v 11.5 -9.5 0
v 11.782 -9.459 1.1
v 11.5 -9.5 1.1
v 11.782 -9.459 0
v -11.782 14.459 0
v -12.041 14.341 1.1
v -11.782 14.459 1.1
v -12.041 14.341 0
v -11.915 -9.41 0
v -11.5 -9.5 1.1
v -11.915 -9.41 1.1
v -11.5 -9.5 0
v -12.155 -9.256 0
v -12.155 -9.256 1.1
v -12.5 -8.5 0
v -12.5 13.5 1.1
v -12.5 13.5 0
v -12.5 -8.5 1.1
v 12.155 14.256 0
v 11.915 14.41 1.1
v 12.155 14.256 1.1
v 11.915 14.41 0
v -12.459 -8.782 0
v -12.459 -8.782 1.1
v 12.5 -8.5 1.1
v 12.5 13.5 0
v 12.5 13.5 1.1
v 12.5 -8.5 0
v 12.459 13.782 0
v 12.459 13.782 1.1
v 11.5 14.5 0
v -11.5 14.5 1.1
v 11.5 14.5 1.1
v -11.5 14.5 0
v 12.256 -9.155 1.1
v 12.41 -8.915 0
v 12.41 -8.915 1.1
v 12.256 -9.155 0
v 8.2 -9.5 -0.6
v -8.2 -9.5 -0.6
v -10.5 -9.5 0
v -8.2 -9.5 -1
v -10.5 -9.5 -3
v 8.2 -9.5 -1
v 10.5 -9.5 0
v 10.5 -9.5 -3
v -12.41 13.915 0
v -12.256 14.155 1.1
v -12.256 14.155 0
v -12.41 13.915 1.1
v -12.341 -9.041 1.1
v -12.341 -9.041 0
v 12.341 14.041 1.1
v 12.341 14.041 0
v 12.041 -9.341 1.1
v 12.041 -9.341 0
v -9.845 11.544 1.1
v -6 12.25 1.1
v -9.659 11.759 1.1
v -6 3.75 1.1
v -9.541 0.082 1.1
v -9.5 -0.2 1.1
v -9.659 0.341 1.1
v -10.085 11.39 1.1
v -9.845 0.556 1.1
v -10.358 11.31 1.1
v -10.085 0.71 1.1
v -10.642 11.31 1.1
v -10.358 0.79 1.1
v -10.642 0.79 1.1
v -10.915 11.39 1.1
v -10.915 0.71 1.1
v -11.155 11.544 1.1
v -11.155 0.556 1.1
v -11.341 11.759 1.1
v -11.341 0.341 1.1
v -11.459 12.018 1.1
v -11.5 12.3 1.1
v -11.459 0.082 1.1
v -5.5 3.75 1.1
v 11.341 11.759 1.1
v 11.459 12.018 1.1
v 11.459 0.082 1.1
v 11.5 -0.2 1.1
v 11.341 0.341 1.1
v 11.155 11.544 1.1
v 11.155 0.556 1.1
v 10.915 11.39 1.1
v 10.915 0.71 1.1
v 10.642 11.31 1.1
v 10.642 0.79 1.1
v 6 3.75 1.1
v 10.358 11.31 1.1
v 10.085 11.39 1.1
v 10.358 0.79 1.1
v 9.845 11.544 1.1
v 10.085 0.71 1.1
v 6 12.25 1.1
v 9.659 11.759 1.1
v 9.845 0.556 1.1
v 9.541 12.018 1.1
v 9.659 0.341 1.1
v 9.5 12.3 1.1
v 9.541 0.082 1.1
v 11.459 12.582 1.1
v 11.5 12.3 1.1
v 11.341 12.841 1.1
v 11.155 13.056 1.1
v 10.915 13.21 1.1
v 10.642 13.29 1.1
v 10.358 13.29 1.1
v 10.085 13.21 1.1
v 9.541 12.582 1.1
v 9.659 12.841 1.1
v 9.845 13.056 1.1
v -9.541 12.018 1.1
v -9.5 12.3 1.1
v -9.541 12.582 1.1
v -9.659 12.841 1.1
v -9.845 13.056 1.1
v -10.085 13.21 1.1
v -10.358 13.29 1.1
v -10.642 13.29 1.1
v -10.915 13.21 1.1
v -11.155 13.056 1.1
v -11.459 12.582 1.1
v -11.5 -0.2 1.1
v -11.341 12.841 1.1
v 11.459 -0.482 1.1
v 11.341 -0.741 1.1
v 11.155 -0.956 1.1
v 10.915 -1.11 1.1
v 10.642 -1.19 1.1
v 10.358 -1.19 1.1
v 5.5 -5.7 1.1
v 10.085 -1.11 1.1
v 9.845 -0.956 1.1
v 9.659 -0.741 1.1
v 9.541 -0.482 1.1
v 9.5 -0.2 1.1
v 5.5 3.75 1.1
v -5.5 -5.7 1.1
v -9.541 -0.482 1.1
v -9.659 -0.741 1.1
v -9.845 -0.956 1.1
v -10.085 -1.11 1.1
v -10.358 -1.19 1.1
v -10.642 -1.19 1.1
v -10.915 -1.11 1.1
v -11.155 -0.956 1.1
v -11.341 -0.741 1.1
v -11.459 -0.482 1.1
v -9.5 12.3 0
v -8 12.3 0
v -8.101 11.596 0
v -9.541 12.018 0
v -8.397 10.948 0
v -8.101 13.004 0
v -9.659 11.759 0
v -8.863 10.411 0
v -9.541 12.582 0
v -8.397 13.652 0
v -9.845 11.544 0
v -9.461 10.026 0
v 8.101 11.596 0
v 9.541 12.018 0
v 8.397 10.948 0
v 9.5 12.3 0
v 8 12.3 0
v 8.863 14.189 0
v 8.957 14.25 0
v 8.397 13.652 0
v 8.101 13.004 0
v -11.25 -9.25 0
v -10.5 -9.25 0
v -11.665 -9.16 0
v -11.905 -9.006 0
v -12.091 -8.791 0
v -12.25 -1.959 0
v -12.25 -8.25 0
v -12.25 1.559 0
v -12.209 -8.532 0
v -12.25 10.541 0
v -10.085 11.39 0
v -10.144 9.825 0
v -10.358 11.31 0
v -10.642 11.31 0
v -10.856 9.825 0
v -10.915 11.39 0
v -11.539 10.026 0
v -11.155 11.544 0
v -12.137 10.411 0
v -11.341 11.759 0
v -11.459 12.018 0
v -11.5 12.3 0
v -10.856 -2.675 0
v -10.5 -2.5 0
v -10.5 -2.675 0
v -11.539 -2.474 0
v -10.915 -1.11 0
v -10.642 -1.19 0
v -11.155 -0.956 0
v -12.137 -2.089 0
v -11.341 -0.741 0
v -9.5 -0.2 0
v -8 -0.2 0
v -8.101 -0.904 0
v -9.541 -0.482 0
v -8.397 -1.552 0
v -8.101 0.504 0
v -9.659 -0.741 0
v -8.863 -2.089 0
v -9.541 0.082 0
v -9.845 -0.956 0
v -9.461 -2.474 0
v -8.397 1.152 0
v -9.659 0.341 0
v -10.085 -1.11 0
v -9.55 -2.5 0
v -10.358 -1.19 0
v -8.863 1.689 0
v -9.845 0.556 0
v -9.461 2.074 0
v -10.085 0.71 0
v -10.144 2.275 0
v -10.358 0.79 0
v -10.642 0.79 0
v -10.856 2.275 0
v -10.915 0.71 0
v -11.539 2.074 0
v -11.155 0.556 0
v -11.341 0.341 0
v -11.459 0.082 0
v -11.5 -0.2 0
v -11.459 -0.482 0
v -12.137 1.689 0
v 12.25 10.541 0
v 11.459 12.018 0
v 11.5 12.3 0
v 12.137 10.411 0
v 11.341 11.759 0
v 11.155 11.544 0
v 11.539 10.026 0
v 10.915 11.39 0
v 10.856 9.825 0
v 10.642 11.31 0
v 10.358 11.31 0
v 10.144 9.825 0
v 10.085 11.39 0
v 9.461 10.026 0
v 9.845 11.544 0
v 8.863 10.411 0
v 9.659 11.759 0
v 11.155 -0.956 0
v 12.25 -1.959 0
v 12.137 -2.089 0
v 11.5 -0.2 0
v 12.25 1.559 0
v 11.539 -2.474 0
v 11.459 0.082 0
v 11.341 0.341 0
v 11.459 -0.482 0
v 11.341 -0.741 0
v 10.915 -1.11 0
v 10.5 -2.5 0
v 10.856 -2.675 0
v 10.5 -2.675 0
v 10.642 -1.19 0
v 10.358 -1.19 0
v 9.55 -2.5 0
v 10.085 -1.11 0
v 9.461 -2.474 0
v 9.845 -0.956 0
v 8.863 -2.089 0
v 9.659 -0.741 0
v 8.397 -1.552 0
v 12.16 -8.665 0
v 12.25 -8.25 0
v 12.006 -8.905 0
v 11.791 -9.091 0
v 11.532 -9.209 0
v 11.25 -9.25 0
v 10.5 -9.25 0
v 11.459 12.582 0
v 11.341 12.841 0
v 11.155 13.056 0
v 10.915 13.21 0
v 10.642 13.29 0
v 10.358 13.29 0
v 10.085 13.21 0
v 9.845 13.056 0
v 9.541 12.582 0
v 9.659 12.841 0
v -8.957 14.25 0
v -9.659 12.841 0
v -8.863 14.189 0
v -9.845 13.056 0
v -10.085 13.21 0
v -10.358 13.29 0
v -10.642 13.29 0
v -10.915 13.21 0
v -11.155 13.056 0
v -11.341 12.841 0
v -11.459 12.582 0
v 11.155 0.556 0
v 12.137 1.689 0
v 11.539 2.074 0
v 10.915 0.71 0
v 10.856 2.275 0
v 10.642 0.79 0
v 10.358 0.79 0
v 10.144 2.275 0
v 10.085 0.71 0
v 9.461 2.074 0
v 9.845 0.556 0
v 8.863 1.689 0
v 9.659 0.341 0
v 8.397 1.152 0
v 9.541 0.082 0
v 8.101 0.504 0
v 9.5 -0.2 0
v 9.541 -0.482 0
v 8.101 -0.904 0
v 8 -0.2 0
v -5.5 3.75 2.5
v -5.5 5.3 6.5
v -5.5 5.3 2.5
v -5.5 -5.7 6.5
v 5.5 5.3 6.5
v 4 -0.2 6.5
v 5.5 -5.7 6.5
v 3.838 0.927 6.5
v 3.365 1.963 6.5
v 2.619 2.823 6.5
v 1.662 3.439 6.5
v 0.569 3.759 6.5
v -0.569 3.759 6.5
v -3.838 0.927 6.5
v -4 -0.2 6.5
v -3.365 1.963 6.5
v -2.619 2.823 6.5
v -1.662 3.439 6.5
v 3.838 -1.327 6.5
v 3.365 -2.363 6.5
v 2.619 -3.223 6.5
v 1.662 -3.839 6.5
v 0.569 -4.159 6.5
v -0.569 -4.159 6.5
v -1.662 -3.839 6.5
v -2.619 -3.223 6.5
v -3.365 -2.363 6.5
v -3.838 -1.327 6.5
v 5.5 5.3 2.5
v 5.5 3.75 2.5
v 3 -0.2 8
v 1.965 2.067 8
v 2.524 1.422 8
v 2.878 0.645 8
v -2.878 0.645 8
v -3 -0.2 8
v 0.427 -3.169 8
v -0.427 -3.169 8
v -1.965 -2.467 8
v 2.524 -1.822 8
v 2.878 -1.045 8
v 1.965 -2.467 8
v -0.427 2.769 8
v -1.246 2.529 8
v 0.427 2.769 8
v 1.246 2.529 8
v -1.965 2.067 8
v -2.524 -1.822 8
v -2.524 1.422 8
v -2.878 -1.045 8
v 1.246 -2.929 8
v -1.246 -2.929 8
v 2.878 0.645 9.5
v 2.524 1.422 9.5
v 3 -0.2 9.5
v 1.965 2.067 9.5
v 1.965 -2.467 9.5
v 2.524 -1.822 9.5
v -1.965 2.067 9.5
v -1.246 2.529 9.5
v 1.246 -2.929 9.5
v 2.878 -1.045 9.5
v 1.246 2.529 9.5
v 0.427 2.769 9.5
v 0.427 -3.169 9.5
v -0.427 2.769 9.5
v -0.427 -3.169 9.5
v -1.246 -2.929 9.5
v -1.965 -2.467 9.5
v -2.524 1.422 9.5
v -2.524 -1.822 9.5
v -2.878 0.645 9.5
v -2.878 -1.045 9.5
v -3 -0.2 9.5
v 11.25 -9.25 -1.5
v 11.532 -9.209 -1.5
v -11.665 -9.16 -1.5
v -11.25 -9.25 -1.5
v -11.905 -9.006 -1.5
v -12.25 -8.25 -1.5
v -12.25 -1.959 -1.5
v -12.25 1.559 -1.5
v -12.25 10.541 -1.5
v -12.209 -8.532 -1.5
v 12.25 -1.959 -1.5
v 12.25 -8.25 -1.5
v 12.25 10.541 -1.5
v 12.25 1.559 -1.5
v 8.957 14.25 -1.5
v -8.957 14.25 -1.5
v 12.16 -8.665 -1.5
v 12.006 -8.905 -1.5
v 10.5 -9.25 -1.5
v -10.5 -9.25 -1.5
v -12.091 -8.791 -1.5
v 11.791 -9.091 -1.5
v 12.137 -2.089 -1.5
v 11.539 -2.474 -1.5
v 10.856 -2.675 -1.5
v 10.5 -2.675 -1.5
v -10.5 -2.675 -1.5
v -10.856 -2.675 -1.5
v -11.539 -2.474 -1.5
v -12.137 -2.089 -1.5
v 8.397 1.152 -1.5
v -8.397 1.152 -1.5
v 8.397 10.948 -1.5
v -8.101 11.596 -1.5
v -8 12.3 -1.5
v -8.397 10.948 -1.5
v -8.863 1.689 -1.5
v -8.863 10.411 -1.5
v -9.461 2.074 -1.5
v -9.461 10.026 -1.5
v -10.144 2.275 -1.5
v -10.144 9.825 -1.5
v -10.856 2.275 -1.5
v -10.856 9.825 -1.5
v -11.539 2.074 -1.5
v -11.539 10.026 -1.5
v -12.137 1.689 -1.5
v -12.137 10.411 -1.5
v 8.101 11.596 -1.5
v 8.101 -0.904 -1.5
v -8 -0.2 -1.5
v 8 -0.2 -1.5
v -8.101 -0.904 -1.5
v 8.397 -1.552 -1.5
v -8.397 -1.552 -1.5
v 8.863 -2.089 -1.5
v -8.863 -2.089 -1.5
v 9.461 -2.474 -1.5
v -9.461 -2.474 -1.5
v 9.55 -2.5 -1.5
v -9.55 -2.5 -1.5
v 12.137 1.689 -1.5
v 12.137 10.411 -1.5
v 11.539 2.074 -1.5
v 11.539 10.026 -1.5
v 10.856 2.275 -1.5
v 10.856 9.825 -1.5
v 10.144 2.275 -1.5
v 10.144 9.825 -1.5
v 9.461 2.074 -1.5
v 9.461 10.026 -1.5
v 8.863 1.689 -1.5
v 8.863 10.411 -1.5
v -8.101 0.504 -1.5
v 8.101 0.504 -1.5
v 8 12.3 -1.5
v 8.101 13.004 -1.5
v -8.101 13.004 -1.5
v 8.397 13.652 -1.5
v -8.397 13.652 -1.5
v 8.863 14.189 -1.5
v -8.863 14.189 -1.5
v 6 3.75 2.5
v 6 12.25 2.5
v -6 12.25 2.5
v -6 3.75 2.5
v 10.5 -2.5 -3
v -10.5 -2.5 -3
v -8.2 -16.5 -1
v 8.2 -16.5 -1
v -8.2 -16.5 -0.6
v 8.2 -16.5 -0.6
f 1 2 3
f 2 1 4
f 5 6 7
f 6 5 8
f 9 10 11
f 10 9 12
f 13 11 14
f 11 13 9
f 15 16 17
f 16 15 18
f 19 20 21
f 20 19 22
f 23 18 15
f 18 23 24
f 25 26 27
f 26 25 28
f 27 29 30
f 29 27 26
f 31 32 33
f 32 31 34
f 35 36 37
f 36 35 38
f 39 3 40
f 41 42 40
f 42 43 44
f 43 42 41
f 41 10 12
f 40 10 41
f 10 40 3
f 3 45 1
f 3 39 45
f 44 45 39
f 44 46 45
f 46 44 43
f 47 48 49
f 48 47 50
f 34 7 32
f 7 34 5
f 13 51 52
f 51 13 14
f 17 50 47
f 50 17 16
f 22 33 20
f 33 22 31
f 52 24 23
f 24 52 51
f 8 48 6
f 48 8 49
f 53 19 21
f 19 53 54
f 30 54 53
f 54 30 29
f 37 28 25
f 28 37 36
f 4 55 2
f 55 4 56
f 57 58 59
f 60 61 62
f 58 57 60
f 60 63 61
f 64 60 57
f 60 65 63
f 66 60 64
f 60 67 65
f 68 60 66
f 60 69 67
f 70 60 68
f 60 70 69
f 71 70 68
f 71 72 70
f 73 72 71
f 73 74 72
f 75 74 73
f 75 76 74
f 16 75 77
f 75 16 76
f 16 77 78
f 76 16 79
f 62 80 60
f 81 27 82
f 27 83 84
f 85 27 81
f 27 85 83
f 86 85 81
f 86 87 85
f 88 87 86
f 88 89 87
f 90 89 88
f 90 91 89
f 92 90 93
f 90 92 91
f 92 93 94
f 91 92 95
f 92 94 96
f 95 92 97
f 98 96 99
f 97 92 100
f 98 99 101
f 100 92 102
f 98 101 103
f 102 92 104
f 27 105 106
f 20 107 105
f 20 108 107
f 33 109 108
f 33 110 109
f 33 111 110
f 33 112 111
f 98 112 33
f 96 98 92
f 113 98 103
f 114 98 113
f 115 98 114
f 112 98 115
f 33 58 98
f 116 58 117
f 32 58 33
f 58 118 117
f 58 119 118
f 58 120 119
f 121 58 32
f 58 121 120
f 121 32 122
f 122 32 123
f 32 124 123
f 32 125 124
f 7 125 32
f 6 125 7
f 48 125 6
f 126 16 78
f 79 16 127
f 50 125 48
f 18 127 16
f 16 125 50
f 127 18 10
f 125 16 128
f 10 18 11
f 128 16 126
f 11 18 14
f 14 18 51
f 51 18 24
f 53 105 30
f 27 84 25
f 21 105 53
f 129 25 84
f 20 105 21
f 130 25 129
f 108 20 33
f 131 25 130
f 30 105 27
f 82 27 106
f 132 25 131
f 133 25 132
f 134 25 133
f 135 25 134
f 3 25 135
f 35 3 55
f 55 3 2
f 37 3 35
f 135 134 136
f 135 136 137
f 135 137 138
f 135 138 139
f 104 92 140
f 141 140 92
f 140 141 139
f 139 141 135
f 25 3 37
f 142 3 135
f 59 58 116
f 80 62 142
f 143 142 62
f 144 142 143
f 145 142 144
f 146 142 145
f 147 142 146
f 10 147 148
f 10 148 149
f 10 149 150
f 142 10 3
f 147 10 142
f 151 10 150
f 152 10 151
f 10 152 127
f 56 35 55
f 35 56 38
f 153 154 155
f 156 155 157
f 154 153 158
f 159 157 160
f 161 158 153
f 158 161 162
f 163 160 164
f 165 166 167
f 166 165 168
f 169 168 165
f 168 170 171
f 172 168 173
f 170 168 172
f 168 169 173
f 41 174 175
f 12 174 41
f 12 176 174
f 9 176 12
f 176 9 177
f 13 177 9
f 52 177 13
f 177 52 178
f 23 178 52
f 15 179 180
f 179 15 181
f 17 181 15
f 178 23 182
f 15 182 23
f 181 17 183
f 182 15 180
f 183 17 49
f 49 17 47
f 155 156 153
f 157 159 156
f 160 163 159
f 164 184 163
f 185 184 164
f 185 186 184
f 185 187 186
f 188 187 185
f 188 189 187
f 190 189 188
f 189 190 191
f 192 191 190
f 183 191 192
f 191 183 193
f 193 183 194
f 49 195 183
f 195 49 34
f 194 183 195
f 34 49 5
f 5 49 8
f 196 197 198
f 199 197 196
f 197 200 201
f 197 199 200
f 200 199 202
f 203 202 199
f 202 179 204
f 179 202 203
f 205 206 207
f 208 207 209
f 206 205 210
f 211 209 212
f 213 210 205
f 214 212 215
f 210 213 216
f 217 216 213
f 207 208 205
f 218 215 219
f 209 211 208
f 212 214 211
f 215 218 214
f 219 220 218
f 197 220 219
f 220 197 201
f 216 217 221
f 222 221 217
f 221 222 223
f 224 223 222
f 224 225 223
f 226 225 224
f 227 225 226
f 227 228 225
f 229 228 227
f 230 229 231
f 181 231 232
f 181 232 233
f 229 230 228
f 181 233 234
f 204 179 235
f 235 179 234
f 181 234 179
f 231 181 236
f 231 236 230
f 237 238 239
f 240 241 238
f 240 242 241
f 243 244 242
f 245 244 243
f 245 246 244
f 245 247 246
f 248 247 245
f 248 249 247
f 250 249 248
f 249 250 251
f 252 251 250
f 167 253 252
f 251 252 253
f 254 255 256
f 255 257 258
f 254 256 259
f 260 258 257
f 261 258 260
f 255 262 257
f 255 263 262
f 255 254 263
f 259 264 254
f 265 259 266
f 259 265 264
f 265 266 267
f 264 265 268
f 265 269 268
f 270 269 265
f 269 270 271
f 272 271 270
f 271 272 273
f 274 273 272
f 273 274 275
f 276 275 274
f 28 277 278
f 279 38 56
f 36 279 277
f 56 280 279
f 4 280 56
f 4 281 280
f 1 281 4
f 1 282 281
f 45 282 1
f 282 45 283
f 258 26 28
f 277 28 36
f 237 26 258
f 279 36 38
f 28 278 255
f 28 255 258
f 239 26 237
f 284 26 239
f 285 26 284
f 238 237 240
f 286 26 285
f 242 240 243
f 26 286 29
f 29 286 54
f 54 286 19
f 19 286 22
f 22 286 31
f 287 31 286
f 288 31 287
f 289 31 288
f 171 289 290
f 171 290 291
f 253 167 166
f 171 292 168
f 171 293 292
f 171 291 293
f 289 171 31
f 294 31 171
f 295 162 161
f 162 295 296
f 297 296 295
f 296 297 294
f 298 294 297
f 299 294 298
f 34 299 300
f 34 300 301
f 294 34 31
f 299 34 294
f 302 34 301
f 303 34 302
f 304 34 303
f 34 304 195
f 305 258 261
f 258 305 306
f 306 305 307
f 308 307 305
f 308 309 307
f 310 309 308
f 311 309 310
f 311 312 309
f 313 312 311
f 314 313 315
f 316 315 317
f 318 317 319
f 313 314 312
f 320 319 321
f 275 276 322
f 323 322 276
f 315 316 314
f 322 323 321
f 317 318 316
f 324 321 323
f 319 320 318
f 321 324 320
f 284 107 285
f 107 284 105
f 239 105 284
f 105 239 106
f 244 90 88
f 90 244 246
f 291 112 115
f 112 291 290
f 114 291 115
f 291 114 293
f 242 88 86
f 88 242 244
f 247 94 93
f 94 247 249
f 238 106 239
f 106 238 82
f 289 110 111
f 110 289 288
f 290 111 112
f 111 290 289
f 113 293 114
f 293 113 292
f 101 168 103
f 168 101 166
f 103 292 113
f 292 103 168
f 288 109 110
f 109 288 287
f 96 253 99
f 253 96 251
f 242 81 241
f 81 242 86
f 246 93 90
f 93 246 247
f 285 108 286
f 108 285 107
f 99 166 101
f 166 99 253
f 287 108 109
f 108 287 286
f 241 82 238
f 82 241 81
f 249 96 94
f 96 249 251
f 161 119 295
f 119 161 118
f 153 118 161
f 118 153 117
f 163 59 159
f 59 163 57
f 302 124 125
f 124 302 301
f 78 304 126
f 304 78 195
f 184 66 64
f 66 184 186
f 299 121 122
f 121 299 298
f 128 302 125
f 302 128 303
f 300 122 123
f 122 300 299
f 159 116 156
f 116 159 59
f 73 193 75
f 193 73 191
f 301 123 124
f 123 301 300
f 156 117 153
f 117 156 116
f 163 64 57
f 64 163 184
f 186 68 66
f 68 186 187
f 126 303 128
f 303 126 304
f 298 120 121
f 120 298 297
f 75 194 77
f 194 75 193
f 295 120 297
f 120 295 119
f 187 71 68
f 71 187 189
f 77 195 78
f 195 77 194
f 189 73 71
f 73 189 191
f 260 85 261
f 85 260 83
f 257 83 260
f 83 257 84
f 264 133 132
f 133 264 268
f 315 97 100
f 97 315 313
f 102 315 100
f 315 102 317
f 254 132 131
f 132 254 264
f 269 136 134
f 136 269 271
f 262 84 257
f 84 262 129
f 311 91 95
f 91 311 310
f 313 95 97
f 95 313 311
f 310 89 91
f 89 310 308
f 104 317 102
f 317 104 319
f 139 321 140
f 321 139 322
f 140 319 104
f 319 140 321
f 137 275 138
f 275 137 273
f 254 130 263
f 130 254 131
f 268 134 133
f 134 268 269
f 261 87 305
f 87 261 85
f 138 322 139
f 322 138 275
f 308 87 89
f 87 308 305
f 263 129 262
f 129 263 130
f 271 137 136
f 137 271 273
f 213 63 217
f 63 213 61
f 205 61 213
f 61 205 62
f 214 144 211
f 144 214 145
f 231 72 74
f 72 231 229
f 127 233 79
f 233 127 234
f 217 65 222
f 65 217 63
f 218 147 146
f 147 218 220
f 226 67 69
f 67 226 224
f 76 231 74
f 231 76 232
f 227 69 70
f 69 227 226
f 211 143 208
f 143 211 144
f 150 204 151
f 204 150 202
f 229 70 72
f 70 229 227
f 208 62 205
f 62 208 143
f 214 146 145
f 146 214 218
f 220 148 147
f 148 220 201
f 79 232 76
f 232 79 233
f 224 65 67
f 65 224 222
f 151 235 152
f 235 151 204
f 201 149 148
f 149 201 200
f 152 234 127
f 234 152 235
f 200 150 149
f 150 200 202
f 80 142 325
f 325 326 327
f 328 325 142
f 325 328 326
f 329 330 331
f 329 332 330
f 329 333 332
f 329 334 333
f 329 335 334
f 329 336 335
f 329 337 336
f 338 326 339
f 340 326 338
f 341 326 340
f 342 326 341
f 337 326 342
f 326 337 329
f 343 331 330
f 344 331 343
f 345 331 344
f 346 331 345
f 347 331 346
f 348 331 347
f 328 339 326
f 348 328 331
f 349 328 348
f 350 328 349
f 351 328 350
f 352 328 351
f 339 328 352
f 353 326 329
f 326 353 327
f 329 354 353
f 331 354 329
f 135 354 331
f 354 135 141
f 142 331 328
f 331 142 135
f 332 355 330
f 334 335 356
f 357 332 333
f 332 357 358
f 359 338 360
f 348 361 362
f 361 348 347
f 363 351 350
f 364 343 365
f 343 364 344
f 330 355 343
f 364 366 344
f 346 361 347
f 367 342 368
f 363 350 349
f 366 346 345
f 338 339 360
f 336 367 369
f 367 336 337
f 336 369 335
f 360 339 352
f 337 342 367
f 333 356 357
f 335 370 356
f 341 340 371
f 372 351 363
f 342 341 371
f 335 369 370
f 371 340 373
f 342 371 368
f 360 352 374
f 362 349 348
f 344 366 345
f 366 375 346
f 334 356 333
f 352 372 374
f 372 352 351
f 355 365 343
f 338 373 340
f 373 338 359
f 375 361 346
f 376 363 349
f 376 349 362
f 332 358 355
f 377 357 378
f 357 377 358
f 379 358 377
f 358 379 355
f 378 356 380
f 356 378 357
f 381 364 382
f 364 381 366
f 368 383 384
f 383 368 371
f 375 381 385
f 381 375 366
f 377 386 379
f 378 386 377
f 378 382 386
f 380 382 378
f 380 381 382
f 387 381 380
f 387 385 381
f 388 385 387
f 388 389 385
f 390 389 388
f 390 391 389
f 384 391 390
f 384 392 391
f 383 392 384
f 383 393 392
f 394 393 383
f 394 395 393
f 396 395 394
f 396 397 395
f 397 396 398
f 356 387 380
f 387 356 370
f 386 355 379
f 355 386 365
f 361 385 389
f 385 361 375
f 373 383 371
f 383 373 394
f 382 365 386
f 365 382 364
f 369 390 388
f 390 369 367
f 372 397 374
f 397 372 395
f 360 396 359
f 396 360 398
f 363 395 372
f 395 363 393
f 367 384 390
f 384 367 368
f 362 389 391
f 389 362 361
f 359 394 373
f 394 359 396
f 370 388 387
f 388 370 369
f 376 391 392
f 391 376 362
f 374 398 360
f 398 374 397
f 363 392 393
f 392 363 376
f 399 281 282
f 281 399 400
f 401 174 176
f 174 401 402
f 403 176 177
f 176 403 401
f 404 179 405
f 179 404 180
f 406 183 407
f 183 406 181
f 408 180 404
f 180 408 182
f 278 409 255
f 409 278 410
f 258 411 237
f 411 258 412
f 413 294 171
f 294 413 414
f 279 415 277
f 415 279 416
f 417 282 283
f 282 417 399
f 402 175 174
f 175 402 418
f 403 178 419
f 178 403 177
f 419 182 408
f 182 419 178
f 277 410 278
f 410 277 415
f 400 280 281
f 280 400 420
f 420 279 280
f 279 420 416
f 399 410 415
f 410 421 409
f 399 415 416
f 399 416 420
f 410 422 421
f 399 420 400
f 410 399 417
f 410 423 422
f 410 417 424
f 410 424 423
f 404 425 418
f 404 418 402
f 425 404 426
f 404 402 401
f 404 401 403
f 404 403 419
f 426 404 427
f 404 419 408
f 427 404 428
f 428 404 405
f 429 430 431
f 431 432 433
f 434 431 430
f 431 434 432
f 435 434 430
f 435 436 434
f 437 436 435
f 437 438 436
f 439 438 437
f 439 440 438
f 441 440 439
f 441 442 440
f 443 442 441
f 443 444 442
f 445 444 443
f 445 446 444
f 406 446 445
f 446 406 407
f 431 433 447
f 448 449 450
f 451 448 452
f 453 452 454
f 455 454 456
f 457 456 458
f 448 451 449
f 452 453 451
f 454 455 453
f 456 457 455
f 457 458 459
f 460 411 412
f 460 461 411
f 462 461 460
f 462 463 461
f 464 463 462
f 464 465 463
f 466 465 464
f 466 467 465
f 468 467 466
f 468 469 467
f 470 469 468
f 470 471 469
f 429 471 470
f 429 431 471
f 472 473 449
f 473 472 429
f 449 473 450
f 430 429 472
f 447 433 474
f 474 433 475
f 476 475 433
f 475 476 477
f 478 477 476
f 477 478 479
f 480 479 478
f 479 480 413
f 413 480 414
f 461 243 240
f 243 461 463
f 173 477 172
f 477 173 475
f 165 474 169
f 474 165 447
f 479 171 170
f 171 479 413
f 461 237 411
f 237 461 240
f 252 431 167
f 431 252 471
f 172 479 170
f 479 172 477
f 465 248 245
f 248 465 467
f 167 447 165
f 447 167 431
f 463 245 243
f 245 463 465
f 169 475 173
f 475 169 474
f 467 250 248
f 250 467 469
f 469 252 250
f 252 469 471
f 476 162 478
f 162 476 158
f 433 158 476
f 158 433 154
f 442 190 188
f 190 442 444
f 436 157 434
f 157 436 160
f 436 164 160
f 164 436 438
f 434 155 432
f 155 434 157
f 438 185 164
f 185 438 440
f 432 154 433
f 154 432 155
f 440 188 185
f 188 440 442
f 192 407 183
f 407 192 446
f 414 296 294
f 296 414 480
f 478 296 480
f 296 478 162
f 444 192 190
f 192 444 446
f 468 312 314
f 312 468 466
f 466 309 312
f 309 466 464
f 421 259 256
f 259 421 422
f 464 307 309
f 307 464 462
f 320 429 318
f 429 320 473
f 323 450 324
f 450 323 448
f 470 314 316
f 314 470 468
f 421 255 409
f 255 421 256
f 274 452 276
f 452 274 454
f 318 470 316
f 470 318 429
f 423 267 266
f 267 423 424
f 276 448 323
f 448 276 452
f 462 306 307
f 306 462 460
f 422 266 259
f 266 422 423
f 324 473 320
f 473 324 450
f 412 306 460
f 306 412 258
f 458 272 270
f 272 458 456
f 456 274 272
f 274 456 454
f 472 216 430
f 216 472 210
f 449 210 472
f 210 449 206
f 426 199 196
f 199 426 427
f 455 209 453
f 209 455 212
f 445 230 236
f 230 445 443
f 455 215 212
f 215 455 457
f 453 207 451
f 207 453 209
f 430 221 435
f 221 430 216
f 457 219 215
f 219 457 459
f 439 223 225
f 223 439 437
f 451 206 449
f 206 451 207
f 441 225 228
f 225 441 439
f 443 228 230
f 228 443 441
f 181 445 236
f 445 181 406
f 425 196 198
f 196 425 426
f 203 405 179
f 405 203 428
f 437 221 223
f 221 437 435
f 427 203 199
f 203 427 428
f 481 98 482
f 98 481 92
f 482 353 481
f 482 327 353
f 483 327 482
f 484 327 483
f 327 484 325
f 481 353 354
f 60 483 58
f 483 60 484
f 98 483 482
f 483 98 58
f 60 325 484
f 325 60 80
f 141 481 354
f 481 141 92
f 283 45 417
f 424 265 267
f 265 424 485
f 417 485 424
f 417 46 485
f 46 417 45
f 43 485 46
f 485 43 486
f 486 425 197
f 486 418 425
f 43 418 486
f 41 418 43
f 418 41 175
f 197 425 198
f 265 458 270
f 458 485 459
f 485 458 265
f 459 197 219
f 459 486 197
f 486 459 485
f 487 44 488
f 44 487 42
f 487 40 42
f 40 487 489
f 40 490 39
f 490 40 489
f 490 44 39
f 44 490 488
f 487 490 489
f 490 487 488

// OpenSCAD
//======================================================================
// usbPower.scad
//
// USB Wall Charger, iGENJUN 2.4A Phone Charger Dual USB Port Cube 
// Power Plug
//
// DrTomFlint, 19 Oct 2024
//======================================================================

//----------------------------------------------------------------------
module cameraV3(){

  // translate so lense is centered
  translate([0,2.5,0]){
  
    // pcb  
    difference(){
        linear_extrude(height=1.1)
        offset(r=1,$fn=22)
        square([23,22],center=true);

        translate([10.5,9.8,0])
        cylinder(r=1,h=3,$fn=22);

        translate([-10.5,9.8,0])
        cylinder(r=1,h=3,$fn=22);

        translate([10.5,9.8-12.5,0])
        cylinder(r=1,h=3,$fn=22);

        translate([-10.5,9.8-12.5,0])
        cylinder(r=1,h=3,$fn=22);
    }

    // lens and box
    translate([0,-2.7,0]){
        linear_extrude(height=6.5)
        square([11,11],center=true);
        translate([0,0,6.5])
        cylinder(r1=8/2,r2=6/2,h=1.5,$fn=22);
        translate([0,0,6.5+1.5])
        cylinder(r=6/2,h=1.5,$fn=22);
    }

    // cable off lens box
    color("red")
    translate([0,5.5,1.25])
    cube([12,8.5,2.5],center=true);

    // main cable
    color("green")
    translate([0,-12+3.5,-1.5])
    cube([21,7,3],center=true);

    // ribbon if needed
    color("orange")
    translate([0,-14,-1])
    linear_extrude(height=0.4)
    square([16.4,10],center=true);

    // component clearance on backside
    //color("red")
    translate([0,0,-1.5])
    difference(){
        linear_extrude(height=1.5)
        offset(r=1,$fn=22)
        square([23-0.5,22-0.5],center=true);

        translate([10.5,9.8,-0.2])
        cylinder(r=2.5,h=2,$fn=22);

        translate([-10.5,9.8,-0.2])
        cylinder(r=2.5,h=2,$fn=22);

        translate([10.5,9.8-12.5,-0.2])
        cylinder(r=2.5,h=2,$fn=22);

        translate([-10.5,9.8-12.5,-0.2])
        cylinder(r=2.5,h=2,$fn=22);
    }
  }
}

//======================================================================

cameraV3();

//======================================================================
